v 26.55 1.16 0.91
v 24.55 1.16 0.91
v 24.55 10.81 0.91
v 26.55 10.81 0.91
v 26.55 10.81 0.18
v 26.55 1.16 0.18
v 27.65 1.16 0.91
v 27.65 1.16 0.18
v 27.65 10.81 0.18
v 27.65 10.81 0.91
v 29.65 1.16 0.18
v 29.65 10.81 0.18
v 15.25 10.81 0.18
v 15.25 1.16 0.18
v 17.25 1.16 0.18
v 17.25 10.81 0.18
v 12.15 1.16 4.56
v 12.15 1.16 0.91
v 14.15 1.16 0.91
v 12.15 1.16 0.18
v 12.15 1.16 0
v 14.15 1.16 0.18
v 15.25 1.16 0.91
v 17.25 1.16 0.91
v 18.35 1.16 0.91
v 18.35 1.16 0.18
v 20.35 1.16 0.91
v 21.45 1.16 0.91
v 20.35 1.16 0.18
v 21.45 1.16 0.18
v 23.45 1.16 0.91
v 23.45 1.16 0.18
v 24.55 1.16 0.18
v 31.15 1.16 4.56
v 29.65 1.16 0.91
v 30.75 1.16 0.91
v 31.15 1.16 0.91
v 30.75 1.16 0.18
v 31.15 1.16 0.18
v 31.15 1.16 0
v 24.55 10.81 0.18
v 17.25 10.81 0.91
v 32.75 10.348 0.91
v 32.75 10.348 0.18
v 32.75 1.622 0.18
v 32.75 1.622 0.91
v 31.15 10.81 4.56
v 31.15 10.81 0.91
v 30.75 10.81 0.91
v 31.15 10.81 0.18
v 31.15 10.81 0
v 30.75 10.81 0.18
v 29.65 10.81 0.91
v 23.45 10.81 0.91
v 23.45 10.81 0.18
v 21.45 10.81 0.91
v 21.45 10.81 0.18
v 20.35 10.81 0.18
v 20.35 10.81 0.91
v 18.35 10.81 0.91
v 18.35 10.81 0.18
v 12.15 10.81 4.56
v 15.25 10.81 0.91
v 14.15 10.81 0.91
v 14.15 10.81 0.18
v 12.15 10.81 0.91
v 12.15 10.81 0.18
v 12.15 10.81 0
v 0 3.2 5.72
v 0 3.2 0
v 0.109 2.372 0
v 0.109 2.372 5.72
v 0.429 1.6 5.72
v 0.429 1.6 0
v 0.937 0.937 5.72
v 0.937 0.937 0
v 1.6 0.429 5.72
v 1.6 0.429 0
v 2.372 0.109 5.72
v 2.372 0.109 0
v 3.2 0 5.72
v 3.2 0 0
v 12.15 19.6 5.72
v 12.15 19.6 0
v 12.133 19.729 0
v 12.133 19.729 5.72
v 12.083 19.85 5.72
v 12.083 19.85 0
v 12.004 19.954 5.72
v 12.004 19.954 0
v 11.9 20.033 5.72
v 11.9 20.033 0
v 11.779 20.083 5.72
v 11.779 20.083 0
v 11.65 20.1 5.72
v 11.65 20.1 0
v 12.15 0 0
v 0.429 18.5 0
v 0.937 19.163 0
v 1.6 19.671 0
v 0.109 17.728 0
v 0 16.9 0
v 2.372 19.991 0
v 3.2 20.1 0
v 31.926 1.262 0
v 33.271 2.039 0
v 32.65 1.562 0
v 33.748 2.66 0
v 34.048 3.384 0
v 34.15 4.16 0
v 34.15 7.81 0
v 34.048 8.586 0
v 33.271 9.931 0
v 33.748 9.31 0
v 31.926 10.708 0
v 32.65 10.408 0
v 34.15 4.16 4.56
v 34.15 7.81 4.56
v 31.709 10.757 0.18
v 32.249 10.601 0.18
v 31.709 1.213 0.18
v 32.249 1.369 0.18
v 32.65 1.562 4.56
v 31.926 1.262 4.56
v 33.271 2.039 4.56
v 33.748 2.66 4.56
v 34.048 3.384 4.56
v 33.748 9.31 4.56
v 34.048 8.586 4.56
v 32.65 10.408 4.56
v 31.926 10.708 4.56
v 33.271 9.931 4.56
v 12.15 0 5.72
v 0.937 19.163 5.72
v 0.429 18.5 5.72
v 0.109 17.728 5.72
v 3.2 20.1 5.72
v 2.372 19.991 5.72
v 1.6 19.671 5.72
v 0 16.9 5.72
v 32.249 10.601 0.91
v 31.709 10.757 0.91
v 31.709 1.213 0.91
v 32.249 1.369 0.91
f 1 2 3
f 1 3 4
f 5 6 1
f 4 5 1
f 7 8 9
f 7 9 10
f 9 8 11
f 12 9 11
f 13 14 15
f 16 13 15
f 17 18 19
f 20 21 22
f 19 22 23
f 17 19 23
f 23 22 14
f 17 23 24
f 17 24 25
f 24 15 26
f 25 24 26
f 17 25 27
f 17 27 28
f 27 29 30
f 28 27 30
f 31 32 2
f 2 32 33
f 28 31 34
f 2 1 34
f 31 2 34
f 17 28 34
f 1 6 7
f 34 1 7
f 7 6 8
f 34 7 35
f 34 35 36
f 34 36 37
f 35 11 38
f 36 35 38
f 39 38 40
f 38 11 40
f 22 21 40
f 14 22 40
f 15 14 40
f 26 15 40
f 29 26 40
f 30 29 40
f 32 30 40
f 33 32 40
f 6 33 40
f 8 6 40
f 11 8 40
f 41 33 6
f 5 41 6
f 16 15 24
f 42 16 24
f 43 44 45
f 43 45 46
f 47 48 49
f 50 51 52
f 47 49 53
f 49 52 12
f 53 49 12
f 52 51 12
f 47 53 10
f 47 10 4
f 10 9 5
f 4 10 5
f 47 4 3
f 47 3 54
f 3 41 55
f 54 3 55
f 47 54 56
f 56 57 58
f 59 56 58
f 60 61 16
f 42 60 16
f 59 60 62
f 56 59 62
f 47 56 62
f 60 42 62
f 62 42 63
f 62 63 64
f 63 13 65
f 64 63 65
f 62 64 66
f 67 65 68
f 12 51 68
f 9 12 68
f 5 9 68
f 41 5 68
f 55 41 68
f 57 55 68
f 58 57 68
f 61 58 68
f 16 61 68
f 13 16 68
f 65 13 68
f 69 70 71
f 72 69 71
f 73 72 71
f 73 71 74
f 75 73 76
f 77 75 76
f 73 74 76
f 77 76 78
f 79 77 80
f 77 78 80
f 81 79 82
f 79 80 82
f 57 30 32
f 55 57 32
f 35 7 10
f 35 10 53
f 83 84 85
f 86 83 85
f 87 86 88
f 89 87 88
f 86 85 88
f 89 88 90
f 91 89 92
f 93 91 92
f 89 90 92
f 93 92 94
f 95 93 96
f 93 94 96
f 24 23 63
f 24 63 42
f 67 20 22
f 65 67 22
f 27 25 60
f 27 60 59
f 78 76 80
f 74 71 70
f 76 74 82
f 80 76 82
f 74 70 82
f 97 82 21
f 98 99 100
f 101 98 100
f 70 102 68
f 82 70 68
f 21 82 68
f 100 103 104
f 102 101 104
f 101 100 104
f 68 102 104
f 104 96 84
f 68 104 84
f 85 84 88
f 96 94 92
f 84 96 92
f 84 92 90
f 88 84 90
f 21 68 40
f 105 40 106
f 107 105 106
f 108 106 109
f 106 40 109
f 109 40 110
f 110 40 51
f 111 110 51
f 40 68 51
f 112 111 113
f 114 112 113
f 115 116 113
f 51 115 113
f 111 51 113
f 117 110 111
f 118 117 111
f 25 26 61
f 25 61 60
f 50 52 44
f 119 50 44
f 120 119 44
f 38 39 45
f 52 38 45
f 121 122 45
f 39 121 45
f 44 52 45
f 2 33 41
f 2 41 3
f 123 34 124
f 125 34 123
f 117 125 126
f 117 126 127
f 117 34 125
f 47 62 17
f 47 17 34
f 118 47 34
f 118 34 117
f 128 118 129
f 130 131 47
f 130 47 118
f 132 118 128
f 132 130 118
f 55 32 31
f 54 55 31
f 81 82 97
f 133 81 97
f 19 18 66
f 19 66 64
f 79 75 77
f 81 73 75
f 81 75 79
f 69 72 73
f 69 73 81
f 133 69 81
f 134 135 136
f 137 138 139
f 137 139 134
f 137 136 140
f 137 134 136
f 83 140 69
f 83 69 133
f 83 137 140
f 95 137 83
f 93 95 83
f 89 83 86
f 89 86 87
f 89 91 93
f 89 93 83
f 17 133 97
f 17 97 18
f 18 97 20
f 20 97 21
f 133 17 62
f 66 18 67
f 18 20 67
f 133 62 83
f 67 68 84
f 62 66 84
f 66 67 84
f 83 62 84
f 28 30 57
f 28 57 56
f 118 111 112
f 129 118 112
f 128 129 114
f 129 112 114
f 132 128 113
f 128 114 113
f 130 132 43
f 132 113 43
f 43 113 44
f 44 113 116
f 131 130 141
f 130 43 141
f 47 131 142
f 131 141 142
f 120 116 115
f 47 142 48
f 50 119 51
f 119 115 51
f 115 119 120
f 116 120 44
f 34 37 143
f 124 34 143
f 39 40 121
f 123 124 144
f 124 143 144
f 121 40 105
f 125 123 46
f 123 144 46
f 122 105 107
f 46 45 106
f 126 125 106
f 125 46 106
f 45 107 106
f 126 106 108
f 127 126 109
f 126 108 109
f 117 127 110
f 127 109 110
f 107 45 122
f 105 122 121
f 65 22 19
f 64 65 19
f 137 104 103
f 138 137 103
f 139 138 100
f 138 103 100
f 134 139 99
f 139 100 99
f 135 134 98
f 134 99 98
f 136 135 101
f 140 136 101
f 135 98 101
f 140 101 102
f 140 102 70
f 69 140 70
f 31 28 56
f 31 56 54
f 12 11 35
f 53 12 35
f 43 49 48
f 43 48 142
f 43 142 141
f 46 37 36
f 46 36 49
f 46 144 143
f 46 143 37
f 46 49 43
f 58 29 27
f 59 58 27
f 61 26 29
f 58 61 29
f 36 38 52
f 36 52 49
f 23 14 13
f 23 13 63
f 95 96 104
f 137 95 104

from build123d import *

# Parameters (mm, degrees)
F2_DEPTH = 5.72
F3_DEPTH = 4.56
F4_W     = 2
F4_H     = 0.73
F5_DEPTH = 18.941


with BuildPart() as f2:
    # F1 (on Top) → F2 (new body)
    with BuildSketch(Plane.XY):
        with BuildLine():
            ThreePointArc((0, 3.2), (0.9372583002, 0.9372583002), (3.2, 0))
            Line((3.2, 0), (12.15, 0))
            Line((12.15, 0), (12.15, 1.16))
            Line((12.15, 1.16), (12.15, 10.81))
            Line((12.15, 10.81), (12.15, 19.6))
            ThreePointArc((12.15, 19.6), (12.0035533906, 19.9535533906), (11.65, 20.1))
            Line((11.65, 20.1), (3.2, 20.1))
            ThreePointArc((3.2, 20.1), (0.9372583002, 19.1627416998), (0, 16.9))
            Line((0, 16.9), (0, 3.2))
        make_face()
    extrude(amount=F2_DEPTH)

    # F1 (on Top) → F3 (join)
    with BuildSketch(Plane.XY):
        with BuildLine():
            Line((12.15, 10.81), (12.15, 1.16))
            Line((12.15, 1.16), (31.15, 1.16))
            ThreePointArc((31.15, 1.16), (33.2713203436, 2.0386796564), (34.15, 4.16))
            Line((34.15, 4.16), (34.15, 7.81))
            ThreePointArc((34.15, 7.81), (33.2713203436, 9.9313203436), (31.15, 10.81))
            Line((31.15, 10.81), (12.15, 10.81))
        make_face()
    extrude(amount=F3_DEPTH)

    # F4 (on face) → F5 (cut, through all)
    with BuildSketch(Plane.XZ.offset(-1.16)):
        with Locations((13.15, 0.545)):
            Rectangle(F4_W, F4_H)
        with Locations((16.25, 0.545)):
            Rectangle(F4_W, F4_H)
        with Locations((19.35, 0.545)):
            Rectangle(F4_W, F4_H)
        with Locations((22.45, 0.545)):
            Rectangle(F4_W, F4_H)
        with Locations((25.55, 0.545)):
            Rectangle(F4_W, F4_H)
        with Locations((28.65, 0.545)):
            Rectangle(F4_W, F4_H)
        with Locations((31.75, 0.545)):
            Rectangle(F4_W, F4_H)
    extrude(amount=-F5_DEPTH, mode=Mode.SUBTRACT)


solid = f2.part
